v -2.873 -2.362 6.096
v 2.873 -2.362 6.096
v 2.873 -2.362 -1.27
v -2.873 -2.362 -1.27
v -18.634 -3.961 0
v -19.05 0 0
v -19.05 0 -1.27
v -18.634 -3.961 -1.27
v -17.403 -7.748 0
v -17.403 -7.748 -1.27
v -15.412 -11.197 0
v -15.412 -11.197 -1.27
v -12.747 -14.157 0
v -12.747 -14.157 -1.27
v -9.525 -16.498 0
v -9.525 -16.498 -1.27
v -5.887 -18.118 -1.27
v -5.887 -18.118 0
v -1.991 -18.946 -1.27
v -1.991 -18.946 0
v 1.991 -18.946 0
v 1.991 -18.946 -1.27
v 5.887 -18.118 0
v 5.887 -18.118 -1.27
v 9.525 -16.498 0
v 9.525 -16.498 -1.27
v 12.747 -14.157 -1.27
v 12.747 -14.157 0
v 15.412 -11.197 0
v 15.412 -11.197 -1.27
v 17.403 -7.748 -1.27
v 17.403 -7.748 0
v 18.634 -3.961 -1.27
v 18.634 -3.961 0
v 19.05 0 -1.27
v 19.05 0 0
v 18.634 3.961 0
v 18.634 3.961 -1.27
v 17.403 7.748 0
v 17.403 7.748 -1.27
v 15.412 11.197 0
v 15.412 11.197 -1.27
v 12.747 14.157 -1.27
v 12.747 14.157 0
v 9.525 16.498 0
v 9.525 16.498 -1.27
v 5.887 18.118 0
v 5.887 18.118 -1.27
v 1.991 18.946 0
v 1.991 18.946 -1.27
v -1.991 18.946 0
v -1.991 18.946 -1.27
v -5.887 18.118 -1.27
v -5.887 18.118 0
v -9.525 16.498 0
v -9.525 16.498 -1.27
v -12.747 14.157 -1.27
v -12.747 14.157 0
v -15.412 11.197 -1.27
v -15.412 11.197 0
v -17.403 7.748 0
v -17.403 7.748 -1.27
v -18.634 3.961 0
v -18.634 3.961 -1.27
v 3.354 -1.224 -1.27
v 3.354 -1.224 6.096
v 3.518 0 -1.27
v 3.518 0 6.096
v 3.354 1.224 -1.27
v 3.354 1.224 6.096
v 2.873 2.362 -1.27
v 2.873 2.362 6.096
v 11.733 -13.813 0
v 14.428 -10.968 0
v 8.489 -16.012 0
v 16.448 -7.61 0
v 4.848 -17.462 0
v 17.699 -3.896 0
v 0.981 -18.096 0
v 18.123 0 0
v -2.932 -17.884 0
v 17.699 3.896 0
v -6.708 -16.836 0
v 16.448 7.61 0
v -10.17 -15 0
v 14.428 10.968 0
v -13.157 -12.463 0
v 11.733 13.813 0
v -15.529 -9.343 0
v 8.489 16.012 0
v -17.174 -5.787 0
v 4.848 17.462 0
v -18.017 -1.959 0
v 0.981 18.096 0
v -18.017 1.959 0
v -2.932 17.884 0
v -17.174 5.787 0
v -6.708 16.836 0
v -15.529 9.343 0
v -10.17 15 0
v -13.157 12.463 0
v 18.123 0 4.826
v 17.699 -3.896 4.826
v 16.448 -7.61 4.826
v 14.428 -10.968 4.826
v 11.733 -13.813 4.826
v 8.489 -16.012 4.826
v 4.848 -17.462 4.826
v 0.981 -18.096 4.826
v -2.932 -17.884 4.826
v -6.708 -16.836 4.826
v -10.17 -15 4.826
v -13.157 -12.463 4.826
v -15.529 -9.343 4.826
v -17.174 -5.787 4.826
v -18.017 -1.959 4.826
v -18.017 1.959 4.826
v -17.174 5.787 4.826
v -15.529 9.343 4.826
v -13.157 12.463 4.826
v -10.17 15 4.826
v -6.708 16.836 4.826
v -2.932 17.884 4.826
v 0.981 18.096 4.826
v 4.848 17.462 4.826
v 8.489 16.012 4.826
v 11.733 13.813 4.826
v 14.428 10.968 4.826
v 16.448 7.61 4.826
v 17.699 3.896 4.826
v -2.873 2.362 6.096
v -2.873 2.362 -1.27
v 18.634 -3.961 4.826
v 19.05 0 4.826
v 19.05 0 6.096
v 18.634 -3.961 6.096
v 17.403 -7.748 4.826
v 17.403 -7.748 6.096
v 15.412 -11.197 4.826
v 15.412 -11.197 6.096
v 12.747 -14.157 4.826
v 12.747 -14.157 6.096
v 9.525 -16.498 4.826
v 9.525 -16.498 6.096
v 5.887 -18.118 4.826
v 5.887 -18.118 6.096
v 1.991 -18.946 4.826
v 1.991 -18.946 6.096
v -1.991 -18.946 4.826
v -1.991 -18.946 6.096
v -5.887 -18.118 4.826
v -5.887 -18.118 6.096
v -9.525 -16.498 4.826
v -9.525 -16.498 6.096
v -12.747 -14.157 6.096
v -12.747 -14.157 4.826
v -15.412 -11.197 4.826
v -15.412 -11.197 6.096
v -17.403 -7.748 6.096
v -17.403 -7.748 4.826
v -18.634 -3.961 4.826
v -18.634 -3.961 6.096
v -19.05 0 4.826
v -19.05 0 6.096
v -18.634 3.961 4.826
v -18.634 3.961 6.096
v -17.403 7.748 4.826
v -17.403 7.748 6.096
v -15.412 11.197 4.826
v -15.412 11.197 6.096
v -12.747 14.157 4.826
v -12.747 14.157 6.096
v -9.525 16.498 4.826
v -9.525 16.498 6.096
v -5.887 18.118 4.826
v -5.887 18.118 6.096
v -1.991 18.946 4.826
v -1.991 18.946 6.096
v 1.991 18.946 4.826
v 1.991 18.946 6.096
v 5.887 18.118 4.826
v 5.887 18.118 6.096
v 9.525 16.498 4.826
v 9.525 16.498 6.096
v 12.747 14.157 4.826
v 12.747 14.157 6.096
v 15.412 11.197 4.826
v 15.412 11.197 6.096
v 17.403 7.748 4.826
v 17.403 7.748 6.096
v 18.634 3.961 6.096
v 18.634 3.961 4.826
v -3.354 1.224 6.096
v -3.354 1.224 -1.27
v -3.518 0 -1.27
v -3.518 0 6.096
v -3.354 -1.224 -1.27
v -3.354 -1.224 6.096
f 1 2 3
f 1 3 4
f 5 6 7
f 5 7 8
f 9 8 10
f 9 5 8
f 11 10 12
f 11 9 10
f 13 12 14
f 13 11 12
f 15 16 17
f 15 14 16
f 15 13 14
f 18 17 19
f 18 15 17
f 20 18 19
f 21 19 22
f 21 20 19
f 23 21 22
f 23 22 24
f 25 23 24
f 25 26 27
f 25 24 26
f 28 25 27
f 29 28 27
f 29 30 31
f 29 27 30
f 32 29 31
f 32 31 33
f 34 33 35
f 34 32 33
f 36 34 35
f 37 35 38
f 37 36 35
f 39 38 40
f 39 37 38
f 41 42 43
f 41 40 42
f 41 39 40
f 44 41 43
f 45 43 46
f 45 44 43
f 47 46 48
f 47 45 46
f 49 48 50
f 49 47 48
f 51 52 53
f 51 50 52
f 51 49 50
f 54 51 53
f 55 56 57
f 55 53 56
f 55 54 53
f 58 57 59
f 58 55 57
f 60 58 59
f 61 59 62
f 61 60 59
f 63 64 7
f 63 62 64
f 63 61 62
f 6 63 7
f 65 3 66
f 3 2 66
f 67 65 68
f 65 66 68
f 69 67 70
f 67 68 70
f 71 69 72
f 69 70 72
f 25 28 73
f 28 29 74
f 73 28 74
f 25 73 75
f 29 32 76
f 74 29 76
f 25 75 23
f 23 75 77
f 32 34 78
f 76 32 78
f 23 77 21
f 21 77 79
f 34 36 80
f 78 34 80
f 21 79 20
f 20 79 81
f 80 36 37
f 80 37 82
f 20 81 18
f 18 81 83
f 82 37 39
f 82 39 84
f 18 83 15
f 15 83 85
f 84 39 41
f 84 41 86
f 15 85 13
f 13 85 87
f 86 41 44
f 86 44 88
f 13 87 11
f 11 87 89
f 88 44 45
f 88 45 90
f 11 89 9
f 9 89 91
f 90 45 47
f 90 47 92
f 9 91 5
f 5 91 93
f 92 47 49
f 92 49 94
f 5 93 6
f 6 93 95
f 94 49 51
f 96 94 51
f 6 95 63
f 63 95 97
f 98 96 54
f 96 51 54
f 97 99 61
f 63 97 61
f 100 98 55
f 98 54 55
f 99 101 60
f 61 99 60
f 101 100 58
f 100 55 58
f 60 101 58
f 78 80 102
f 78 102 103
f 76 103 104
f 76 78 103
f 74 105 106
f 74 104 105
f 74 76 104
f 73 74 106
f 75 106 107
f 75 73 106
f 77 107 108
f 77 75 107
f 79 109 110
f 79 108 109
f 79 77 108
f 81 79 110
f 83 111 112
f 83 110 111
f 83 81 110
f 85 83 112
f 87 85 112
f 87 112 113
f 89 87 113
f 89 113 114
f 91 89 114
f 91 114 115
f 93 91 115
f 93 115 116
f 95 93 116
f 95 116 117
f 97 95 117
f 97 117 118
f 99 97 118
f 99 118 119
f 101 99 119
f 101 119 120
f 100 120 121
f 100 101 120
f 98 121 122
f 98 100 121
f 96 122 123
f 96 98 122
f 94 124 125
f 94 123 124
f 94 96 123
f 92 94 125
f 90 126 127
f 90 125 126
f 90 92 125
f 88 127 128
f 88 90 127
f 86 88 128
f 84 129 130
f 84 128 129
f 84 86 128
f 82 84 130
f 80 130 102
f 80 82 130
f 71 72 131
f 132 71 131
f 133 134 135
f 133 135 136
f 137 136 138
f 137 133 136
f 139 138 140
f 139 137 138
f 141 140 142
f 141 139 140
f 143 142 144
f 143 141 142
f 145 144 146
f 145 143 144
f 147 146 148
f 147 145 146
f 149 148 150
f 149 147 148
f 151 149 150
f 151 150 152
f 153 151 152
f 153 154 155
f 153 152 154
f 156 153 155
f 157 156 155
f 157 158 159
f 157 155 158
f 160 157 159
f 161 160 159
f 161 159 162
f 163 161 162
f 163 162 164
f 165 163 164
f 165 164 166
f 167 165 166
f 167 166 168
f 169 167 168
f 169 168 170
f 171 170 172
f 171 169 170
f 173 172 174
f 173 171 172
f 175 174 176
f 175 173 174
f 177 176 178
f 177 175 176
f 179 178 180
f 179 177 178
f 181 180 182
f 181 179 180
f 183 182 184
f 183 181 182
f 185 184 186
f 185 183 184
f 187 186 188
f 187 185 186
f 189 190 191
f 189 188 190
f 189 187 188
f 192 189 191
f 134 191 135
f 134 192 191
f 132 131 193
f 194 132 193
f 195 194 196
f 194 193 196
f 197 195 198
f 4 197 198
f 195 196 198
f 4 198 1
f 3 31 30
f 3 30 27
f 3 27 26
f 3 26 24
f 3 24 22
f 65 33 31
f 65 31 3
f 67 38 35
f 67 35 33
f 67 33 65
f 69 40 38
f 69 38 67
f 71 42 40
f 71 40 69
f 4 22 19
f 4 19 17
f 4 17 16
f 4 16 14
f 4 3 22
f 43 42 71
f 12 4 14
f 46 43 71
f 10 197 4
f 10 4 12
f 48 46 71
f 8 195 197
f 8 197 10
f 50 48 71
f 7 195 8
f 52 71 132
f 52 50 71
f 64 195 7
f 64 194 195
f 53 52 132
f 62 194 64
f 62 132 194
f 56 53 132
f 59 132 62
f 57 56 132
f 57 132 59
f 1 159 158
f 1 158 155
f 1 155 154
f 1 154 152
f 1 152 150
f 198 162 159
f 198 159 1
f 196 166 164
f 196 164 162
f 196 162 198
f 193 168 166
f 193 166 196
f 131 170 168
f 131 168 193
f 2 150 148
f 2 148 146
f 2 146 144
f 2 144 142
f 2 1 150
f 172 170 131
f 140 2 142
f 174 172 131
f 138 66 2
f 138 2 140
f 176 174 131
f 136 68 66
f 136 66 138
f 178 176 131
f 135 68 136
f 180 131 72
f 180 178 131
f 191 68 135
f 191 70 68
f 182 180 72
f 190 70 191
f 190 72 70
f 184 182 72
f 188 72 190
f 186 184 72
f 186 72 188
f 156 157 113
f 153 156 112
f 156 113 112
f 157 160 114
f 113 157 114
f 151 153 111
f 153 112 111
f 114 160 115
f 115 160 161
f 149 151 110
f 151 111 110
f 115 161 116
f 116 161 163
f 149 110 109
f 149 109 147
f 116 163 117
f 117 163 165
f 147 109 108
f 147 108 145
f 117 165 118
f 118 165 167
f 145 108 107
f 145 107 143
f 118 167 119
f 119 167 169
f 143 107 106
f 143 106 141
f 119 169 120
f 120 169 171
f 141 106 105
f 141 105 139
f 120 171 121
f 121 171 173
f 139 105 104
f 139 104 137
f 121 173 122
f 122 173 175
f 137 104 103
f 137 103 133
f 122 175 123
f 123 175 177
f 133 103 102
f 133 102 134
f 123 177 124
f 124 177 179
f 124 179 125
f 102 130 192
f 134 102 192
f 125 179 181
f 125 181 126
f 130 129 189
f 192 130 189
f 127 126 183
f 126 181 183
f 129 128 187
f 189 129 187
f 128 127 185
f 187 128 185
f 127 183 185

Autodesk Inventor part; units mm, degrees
ref_plane "YZ Plane" through (0, 0, 0) normal (1, 0, 0) x (0, 1, 0)
ref_plane "XZ Plane" through (0, 0, 0) normal (0, 1, 0) x (-1, 0, 0)
ref_plane "XY Plane" through (0, 0, 0) normal (0, 0, 1) x (1, 0, 0)
sketch "Sketch1" plane through (0, 0, 0) normal (0, 0, 1) x (1, 0, 0)
  circle A0 centre (0, 0) radius 18.1229
  circle A1 centre (0, 0) radius 18.9615
  dimension "d0" = 36.2458
extrude "Extrusion3" add sketch "Sketch1" along normal blind 4.826 contours A0
sketch "Sketch4" plane through (0, 0, 4.826) normal (0, 0, 1) x (1, 0, 0)
  circle A0 centre (0, 0) radius 19.05
  dimension "d17" = 38.1
extrude "Extrusion4" add sketch "Sketch4" along normal blind 1.27
sketch "Sketch5" plane through (0, 0, 0) normal (0, 0, -1) x (-1, 0, 0)
  circle A0 centre (0, 0) radius 19.05
  dimension "d18" = 38.1
extrude "Extrusion5" add sketch "Sketch5" along normal blind 1.27
sketch "Sketch6" plane through (0, 0, 6.096) normal (0, 0, 1) x (1, 0, 0)
  line L0 (2.8729, -2.3622) -> (-2.8729, -2.3622)
  line L1 (2.8729, 2.3622) -> (-2.8729, 2.3622)
  arc A0 (2.8729, -2.3622) -> (2.8729, 2.3622) centre (-1.1303, 0) ccw
  arc A1 (-2.8729, 2.3622) -> (-2.8729, -2.3622) centre (1.1303, 0) ccw
  line L2 (3.5179, 0) -> (-3.5179, 0)
  line L3 (0, 2.3622) -> (0, -2.3622)
  dimension "d23" = 4.7244
  dimension "d24" = 4.6482
  dimension "d25" = 4.6482
  dimension "d26" = 7.0358
extrude "Extrusion7" cut sketch "Sketch6" against normal blind 25.4
properties part number "big tire sumo robot"
